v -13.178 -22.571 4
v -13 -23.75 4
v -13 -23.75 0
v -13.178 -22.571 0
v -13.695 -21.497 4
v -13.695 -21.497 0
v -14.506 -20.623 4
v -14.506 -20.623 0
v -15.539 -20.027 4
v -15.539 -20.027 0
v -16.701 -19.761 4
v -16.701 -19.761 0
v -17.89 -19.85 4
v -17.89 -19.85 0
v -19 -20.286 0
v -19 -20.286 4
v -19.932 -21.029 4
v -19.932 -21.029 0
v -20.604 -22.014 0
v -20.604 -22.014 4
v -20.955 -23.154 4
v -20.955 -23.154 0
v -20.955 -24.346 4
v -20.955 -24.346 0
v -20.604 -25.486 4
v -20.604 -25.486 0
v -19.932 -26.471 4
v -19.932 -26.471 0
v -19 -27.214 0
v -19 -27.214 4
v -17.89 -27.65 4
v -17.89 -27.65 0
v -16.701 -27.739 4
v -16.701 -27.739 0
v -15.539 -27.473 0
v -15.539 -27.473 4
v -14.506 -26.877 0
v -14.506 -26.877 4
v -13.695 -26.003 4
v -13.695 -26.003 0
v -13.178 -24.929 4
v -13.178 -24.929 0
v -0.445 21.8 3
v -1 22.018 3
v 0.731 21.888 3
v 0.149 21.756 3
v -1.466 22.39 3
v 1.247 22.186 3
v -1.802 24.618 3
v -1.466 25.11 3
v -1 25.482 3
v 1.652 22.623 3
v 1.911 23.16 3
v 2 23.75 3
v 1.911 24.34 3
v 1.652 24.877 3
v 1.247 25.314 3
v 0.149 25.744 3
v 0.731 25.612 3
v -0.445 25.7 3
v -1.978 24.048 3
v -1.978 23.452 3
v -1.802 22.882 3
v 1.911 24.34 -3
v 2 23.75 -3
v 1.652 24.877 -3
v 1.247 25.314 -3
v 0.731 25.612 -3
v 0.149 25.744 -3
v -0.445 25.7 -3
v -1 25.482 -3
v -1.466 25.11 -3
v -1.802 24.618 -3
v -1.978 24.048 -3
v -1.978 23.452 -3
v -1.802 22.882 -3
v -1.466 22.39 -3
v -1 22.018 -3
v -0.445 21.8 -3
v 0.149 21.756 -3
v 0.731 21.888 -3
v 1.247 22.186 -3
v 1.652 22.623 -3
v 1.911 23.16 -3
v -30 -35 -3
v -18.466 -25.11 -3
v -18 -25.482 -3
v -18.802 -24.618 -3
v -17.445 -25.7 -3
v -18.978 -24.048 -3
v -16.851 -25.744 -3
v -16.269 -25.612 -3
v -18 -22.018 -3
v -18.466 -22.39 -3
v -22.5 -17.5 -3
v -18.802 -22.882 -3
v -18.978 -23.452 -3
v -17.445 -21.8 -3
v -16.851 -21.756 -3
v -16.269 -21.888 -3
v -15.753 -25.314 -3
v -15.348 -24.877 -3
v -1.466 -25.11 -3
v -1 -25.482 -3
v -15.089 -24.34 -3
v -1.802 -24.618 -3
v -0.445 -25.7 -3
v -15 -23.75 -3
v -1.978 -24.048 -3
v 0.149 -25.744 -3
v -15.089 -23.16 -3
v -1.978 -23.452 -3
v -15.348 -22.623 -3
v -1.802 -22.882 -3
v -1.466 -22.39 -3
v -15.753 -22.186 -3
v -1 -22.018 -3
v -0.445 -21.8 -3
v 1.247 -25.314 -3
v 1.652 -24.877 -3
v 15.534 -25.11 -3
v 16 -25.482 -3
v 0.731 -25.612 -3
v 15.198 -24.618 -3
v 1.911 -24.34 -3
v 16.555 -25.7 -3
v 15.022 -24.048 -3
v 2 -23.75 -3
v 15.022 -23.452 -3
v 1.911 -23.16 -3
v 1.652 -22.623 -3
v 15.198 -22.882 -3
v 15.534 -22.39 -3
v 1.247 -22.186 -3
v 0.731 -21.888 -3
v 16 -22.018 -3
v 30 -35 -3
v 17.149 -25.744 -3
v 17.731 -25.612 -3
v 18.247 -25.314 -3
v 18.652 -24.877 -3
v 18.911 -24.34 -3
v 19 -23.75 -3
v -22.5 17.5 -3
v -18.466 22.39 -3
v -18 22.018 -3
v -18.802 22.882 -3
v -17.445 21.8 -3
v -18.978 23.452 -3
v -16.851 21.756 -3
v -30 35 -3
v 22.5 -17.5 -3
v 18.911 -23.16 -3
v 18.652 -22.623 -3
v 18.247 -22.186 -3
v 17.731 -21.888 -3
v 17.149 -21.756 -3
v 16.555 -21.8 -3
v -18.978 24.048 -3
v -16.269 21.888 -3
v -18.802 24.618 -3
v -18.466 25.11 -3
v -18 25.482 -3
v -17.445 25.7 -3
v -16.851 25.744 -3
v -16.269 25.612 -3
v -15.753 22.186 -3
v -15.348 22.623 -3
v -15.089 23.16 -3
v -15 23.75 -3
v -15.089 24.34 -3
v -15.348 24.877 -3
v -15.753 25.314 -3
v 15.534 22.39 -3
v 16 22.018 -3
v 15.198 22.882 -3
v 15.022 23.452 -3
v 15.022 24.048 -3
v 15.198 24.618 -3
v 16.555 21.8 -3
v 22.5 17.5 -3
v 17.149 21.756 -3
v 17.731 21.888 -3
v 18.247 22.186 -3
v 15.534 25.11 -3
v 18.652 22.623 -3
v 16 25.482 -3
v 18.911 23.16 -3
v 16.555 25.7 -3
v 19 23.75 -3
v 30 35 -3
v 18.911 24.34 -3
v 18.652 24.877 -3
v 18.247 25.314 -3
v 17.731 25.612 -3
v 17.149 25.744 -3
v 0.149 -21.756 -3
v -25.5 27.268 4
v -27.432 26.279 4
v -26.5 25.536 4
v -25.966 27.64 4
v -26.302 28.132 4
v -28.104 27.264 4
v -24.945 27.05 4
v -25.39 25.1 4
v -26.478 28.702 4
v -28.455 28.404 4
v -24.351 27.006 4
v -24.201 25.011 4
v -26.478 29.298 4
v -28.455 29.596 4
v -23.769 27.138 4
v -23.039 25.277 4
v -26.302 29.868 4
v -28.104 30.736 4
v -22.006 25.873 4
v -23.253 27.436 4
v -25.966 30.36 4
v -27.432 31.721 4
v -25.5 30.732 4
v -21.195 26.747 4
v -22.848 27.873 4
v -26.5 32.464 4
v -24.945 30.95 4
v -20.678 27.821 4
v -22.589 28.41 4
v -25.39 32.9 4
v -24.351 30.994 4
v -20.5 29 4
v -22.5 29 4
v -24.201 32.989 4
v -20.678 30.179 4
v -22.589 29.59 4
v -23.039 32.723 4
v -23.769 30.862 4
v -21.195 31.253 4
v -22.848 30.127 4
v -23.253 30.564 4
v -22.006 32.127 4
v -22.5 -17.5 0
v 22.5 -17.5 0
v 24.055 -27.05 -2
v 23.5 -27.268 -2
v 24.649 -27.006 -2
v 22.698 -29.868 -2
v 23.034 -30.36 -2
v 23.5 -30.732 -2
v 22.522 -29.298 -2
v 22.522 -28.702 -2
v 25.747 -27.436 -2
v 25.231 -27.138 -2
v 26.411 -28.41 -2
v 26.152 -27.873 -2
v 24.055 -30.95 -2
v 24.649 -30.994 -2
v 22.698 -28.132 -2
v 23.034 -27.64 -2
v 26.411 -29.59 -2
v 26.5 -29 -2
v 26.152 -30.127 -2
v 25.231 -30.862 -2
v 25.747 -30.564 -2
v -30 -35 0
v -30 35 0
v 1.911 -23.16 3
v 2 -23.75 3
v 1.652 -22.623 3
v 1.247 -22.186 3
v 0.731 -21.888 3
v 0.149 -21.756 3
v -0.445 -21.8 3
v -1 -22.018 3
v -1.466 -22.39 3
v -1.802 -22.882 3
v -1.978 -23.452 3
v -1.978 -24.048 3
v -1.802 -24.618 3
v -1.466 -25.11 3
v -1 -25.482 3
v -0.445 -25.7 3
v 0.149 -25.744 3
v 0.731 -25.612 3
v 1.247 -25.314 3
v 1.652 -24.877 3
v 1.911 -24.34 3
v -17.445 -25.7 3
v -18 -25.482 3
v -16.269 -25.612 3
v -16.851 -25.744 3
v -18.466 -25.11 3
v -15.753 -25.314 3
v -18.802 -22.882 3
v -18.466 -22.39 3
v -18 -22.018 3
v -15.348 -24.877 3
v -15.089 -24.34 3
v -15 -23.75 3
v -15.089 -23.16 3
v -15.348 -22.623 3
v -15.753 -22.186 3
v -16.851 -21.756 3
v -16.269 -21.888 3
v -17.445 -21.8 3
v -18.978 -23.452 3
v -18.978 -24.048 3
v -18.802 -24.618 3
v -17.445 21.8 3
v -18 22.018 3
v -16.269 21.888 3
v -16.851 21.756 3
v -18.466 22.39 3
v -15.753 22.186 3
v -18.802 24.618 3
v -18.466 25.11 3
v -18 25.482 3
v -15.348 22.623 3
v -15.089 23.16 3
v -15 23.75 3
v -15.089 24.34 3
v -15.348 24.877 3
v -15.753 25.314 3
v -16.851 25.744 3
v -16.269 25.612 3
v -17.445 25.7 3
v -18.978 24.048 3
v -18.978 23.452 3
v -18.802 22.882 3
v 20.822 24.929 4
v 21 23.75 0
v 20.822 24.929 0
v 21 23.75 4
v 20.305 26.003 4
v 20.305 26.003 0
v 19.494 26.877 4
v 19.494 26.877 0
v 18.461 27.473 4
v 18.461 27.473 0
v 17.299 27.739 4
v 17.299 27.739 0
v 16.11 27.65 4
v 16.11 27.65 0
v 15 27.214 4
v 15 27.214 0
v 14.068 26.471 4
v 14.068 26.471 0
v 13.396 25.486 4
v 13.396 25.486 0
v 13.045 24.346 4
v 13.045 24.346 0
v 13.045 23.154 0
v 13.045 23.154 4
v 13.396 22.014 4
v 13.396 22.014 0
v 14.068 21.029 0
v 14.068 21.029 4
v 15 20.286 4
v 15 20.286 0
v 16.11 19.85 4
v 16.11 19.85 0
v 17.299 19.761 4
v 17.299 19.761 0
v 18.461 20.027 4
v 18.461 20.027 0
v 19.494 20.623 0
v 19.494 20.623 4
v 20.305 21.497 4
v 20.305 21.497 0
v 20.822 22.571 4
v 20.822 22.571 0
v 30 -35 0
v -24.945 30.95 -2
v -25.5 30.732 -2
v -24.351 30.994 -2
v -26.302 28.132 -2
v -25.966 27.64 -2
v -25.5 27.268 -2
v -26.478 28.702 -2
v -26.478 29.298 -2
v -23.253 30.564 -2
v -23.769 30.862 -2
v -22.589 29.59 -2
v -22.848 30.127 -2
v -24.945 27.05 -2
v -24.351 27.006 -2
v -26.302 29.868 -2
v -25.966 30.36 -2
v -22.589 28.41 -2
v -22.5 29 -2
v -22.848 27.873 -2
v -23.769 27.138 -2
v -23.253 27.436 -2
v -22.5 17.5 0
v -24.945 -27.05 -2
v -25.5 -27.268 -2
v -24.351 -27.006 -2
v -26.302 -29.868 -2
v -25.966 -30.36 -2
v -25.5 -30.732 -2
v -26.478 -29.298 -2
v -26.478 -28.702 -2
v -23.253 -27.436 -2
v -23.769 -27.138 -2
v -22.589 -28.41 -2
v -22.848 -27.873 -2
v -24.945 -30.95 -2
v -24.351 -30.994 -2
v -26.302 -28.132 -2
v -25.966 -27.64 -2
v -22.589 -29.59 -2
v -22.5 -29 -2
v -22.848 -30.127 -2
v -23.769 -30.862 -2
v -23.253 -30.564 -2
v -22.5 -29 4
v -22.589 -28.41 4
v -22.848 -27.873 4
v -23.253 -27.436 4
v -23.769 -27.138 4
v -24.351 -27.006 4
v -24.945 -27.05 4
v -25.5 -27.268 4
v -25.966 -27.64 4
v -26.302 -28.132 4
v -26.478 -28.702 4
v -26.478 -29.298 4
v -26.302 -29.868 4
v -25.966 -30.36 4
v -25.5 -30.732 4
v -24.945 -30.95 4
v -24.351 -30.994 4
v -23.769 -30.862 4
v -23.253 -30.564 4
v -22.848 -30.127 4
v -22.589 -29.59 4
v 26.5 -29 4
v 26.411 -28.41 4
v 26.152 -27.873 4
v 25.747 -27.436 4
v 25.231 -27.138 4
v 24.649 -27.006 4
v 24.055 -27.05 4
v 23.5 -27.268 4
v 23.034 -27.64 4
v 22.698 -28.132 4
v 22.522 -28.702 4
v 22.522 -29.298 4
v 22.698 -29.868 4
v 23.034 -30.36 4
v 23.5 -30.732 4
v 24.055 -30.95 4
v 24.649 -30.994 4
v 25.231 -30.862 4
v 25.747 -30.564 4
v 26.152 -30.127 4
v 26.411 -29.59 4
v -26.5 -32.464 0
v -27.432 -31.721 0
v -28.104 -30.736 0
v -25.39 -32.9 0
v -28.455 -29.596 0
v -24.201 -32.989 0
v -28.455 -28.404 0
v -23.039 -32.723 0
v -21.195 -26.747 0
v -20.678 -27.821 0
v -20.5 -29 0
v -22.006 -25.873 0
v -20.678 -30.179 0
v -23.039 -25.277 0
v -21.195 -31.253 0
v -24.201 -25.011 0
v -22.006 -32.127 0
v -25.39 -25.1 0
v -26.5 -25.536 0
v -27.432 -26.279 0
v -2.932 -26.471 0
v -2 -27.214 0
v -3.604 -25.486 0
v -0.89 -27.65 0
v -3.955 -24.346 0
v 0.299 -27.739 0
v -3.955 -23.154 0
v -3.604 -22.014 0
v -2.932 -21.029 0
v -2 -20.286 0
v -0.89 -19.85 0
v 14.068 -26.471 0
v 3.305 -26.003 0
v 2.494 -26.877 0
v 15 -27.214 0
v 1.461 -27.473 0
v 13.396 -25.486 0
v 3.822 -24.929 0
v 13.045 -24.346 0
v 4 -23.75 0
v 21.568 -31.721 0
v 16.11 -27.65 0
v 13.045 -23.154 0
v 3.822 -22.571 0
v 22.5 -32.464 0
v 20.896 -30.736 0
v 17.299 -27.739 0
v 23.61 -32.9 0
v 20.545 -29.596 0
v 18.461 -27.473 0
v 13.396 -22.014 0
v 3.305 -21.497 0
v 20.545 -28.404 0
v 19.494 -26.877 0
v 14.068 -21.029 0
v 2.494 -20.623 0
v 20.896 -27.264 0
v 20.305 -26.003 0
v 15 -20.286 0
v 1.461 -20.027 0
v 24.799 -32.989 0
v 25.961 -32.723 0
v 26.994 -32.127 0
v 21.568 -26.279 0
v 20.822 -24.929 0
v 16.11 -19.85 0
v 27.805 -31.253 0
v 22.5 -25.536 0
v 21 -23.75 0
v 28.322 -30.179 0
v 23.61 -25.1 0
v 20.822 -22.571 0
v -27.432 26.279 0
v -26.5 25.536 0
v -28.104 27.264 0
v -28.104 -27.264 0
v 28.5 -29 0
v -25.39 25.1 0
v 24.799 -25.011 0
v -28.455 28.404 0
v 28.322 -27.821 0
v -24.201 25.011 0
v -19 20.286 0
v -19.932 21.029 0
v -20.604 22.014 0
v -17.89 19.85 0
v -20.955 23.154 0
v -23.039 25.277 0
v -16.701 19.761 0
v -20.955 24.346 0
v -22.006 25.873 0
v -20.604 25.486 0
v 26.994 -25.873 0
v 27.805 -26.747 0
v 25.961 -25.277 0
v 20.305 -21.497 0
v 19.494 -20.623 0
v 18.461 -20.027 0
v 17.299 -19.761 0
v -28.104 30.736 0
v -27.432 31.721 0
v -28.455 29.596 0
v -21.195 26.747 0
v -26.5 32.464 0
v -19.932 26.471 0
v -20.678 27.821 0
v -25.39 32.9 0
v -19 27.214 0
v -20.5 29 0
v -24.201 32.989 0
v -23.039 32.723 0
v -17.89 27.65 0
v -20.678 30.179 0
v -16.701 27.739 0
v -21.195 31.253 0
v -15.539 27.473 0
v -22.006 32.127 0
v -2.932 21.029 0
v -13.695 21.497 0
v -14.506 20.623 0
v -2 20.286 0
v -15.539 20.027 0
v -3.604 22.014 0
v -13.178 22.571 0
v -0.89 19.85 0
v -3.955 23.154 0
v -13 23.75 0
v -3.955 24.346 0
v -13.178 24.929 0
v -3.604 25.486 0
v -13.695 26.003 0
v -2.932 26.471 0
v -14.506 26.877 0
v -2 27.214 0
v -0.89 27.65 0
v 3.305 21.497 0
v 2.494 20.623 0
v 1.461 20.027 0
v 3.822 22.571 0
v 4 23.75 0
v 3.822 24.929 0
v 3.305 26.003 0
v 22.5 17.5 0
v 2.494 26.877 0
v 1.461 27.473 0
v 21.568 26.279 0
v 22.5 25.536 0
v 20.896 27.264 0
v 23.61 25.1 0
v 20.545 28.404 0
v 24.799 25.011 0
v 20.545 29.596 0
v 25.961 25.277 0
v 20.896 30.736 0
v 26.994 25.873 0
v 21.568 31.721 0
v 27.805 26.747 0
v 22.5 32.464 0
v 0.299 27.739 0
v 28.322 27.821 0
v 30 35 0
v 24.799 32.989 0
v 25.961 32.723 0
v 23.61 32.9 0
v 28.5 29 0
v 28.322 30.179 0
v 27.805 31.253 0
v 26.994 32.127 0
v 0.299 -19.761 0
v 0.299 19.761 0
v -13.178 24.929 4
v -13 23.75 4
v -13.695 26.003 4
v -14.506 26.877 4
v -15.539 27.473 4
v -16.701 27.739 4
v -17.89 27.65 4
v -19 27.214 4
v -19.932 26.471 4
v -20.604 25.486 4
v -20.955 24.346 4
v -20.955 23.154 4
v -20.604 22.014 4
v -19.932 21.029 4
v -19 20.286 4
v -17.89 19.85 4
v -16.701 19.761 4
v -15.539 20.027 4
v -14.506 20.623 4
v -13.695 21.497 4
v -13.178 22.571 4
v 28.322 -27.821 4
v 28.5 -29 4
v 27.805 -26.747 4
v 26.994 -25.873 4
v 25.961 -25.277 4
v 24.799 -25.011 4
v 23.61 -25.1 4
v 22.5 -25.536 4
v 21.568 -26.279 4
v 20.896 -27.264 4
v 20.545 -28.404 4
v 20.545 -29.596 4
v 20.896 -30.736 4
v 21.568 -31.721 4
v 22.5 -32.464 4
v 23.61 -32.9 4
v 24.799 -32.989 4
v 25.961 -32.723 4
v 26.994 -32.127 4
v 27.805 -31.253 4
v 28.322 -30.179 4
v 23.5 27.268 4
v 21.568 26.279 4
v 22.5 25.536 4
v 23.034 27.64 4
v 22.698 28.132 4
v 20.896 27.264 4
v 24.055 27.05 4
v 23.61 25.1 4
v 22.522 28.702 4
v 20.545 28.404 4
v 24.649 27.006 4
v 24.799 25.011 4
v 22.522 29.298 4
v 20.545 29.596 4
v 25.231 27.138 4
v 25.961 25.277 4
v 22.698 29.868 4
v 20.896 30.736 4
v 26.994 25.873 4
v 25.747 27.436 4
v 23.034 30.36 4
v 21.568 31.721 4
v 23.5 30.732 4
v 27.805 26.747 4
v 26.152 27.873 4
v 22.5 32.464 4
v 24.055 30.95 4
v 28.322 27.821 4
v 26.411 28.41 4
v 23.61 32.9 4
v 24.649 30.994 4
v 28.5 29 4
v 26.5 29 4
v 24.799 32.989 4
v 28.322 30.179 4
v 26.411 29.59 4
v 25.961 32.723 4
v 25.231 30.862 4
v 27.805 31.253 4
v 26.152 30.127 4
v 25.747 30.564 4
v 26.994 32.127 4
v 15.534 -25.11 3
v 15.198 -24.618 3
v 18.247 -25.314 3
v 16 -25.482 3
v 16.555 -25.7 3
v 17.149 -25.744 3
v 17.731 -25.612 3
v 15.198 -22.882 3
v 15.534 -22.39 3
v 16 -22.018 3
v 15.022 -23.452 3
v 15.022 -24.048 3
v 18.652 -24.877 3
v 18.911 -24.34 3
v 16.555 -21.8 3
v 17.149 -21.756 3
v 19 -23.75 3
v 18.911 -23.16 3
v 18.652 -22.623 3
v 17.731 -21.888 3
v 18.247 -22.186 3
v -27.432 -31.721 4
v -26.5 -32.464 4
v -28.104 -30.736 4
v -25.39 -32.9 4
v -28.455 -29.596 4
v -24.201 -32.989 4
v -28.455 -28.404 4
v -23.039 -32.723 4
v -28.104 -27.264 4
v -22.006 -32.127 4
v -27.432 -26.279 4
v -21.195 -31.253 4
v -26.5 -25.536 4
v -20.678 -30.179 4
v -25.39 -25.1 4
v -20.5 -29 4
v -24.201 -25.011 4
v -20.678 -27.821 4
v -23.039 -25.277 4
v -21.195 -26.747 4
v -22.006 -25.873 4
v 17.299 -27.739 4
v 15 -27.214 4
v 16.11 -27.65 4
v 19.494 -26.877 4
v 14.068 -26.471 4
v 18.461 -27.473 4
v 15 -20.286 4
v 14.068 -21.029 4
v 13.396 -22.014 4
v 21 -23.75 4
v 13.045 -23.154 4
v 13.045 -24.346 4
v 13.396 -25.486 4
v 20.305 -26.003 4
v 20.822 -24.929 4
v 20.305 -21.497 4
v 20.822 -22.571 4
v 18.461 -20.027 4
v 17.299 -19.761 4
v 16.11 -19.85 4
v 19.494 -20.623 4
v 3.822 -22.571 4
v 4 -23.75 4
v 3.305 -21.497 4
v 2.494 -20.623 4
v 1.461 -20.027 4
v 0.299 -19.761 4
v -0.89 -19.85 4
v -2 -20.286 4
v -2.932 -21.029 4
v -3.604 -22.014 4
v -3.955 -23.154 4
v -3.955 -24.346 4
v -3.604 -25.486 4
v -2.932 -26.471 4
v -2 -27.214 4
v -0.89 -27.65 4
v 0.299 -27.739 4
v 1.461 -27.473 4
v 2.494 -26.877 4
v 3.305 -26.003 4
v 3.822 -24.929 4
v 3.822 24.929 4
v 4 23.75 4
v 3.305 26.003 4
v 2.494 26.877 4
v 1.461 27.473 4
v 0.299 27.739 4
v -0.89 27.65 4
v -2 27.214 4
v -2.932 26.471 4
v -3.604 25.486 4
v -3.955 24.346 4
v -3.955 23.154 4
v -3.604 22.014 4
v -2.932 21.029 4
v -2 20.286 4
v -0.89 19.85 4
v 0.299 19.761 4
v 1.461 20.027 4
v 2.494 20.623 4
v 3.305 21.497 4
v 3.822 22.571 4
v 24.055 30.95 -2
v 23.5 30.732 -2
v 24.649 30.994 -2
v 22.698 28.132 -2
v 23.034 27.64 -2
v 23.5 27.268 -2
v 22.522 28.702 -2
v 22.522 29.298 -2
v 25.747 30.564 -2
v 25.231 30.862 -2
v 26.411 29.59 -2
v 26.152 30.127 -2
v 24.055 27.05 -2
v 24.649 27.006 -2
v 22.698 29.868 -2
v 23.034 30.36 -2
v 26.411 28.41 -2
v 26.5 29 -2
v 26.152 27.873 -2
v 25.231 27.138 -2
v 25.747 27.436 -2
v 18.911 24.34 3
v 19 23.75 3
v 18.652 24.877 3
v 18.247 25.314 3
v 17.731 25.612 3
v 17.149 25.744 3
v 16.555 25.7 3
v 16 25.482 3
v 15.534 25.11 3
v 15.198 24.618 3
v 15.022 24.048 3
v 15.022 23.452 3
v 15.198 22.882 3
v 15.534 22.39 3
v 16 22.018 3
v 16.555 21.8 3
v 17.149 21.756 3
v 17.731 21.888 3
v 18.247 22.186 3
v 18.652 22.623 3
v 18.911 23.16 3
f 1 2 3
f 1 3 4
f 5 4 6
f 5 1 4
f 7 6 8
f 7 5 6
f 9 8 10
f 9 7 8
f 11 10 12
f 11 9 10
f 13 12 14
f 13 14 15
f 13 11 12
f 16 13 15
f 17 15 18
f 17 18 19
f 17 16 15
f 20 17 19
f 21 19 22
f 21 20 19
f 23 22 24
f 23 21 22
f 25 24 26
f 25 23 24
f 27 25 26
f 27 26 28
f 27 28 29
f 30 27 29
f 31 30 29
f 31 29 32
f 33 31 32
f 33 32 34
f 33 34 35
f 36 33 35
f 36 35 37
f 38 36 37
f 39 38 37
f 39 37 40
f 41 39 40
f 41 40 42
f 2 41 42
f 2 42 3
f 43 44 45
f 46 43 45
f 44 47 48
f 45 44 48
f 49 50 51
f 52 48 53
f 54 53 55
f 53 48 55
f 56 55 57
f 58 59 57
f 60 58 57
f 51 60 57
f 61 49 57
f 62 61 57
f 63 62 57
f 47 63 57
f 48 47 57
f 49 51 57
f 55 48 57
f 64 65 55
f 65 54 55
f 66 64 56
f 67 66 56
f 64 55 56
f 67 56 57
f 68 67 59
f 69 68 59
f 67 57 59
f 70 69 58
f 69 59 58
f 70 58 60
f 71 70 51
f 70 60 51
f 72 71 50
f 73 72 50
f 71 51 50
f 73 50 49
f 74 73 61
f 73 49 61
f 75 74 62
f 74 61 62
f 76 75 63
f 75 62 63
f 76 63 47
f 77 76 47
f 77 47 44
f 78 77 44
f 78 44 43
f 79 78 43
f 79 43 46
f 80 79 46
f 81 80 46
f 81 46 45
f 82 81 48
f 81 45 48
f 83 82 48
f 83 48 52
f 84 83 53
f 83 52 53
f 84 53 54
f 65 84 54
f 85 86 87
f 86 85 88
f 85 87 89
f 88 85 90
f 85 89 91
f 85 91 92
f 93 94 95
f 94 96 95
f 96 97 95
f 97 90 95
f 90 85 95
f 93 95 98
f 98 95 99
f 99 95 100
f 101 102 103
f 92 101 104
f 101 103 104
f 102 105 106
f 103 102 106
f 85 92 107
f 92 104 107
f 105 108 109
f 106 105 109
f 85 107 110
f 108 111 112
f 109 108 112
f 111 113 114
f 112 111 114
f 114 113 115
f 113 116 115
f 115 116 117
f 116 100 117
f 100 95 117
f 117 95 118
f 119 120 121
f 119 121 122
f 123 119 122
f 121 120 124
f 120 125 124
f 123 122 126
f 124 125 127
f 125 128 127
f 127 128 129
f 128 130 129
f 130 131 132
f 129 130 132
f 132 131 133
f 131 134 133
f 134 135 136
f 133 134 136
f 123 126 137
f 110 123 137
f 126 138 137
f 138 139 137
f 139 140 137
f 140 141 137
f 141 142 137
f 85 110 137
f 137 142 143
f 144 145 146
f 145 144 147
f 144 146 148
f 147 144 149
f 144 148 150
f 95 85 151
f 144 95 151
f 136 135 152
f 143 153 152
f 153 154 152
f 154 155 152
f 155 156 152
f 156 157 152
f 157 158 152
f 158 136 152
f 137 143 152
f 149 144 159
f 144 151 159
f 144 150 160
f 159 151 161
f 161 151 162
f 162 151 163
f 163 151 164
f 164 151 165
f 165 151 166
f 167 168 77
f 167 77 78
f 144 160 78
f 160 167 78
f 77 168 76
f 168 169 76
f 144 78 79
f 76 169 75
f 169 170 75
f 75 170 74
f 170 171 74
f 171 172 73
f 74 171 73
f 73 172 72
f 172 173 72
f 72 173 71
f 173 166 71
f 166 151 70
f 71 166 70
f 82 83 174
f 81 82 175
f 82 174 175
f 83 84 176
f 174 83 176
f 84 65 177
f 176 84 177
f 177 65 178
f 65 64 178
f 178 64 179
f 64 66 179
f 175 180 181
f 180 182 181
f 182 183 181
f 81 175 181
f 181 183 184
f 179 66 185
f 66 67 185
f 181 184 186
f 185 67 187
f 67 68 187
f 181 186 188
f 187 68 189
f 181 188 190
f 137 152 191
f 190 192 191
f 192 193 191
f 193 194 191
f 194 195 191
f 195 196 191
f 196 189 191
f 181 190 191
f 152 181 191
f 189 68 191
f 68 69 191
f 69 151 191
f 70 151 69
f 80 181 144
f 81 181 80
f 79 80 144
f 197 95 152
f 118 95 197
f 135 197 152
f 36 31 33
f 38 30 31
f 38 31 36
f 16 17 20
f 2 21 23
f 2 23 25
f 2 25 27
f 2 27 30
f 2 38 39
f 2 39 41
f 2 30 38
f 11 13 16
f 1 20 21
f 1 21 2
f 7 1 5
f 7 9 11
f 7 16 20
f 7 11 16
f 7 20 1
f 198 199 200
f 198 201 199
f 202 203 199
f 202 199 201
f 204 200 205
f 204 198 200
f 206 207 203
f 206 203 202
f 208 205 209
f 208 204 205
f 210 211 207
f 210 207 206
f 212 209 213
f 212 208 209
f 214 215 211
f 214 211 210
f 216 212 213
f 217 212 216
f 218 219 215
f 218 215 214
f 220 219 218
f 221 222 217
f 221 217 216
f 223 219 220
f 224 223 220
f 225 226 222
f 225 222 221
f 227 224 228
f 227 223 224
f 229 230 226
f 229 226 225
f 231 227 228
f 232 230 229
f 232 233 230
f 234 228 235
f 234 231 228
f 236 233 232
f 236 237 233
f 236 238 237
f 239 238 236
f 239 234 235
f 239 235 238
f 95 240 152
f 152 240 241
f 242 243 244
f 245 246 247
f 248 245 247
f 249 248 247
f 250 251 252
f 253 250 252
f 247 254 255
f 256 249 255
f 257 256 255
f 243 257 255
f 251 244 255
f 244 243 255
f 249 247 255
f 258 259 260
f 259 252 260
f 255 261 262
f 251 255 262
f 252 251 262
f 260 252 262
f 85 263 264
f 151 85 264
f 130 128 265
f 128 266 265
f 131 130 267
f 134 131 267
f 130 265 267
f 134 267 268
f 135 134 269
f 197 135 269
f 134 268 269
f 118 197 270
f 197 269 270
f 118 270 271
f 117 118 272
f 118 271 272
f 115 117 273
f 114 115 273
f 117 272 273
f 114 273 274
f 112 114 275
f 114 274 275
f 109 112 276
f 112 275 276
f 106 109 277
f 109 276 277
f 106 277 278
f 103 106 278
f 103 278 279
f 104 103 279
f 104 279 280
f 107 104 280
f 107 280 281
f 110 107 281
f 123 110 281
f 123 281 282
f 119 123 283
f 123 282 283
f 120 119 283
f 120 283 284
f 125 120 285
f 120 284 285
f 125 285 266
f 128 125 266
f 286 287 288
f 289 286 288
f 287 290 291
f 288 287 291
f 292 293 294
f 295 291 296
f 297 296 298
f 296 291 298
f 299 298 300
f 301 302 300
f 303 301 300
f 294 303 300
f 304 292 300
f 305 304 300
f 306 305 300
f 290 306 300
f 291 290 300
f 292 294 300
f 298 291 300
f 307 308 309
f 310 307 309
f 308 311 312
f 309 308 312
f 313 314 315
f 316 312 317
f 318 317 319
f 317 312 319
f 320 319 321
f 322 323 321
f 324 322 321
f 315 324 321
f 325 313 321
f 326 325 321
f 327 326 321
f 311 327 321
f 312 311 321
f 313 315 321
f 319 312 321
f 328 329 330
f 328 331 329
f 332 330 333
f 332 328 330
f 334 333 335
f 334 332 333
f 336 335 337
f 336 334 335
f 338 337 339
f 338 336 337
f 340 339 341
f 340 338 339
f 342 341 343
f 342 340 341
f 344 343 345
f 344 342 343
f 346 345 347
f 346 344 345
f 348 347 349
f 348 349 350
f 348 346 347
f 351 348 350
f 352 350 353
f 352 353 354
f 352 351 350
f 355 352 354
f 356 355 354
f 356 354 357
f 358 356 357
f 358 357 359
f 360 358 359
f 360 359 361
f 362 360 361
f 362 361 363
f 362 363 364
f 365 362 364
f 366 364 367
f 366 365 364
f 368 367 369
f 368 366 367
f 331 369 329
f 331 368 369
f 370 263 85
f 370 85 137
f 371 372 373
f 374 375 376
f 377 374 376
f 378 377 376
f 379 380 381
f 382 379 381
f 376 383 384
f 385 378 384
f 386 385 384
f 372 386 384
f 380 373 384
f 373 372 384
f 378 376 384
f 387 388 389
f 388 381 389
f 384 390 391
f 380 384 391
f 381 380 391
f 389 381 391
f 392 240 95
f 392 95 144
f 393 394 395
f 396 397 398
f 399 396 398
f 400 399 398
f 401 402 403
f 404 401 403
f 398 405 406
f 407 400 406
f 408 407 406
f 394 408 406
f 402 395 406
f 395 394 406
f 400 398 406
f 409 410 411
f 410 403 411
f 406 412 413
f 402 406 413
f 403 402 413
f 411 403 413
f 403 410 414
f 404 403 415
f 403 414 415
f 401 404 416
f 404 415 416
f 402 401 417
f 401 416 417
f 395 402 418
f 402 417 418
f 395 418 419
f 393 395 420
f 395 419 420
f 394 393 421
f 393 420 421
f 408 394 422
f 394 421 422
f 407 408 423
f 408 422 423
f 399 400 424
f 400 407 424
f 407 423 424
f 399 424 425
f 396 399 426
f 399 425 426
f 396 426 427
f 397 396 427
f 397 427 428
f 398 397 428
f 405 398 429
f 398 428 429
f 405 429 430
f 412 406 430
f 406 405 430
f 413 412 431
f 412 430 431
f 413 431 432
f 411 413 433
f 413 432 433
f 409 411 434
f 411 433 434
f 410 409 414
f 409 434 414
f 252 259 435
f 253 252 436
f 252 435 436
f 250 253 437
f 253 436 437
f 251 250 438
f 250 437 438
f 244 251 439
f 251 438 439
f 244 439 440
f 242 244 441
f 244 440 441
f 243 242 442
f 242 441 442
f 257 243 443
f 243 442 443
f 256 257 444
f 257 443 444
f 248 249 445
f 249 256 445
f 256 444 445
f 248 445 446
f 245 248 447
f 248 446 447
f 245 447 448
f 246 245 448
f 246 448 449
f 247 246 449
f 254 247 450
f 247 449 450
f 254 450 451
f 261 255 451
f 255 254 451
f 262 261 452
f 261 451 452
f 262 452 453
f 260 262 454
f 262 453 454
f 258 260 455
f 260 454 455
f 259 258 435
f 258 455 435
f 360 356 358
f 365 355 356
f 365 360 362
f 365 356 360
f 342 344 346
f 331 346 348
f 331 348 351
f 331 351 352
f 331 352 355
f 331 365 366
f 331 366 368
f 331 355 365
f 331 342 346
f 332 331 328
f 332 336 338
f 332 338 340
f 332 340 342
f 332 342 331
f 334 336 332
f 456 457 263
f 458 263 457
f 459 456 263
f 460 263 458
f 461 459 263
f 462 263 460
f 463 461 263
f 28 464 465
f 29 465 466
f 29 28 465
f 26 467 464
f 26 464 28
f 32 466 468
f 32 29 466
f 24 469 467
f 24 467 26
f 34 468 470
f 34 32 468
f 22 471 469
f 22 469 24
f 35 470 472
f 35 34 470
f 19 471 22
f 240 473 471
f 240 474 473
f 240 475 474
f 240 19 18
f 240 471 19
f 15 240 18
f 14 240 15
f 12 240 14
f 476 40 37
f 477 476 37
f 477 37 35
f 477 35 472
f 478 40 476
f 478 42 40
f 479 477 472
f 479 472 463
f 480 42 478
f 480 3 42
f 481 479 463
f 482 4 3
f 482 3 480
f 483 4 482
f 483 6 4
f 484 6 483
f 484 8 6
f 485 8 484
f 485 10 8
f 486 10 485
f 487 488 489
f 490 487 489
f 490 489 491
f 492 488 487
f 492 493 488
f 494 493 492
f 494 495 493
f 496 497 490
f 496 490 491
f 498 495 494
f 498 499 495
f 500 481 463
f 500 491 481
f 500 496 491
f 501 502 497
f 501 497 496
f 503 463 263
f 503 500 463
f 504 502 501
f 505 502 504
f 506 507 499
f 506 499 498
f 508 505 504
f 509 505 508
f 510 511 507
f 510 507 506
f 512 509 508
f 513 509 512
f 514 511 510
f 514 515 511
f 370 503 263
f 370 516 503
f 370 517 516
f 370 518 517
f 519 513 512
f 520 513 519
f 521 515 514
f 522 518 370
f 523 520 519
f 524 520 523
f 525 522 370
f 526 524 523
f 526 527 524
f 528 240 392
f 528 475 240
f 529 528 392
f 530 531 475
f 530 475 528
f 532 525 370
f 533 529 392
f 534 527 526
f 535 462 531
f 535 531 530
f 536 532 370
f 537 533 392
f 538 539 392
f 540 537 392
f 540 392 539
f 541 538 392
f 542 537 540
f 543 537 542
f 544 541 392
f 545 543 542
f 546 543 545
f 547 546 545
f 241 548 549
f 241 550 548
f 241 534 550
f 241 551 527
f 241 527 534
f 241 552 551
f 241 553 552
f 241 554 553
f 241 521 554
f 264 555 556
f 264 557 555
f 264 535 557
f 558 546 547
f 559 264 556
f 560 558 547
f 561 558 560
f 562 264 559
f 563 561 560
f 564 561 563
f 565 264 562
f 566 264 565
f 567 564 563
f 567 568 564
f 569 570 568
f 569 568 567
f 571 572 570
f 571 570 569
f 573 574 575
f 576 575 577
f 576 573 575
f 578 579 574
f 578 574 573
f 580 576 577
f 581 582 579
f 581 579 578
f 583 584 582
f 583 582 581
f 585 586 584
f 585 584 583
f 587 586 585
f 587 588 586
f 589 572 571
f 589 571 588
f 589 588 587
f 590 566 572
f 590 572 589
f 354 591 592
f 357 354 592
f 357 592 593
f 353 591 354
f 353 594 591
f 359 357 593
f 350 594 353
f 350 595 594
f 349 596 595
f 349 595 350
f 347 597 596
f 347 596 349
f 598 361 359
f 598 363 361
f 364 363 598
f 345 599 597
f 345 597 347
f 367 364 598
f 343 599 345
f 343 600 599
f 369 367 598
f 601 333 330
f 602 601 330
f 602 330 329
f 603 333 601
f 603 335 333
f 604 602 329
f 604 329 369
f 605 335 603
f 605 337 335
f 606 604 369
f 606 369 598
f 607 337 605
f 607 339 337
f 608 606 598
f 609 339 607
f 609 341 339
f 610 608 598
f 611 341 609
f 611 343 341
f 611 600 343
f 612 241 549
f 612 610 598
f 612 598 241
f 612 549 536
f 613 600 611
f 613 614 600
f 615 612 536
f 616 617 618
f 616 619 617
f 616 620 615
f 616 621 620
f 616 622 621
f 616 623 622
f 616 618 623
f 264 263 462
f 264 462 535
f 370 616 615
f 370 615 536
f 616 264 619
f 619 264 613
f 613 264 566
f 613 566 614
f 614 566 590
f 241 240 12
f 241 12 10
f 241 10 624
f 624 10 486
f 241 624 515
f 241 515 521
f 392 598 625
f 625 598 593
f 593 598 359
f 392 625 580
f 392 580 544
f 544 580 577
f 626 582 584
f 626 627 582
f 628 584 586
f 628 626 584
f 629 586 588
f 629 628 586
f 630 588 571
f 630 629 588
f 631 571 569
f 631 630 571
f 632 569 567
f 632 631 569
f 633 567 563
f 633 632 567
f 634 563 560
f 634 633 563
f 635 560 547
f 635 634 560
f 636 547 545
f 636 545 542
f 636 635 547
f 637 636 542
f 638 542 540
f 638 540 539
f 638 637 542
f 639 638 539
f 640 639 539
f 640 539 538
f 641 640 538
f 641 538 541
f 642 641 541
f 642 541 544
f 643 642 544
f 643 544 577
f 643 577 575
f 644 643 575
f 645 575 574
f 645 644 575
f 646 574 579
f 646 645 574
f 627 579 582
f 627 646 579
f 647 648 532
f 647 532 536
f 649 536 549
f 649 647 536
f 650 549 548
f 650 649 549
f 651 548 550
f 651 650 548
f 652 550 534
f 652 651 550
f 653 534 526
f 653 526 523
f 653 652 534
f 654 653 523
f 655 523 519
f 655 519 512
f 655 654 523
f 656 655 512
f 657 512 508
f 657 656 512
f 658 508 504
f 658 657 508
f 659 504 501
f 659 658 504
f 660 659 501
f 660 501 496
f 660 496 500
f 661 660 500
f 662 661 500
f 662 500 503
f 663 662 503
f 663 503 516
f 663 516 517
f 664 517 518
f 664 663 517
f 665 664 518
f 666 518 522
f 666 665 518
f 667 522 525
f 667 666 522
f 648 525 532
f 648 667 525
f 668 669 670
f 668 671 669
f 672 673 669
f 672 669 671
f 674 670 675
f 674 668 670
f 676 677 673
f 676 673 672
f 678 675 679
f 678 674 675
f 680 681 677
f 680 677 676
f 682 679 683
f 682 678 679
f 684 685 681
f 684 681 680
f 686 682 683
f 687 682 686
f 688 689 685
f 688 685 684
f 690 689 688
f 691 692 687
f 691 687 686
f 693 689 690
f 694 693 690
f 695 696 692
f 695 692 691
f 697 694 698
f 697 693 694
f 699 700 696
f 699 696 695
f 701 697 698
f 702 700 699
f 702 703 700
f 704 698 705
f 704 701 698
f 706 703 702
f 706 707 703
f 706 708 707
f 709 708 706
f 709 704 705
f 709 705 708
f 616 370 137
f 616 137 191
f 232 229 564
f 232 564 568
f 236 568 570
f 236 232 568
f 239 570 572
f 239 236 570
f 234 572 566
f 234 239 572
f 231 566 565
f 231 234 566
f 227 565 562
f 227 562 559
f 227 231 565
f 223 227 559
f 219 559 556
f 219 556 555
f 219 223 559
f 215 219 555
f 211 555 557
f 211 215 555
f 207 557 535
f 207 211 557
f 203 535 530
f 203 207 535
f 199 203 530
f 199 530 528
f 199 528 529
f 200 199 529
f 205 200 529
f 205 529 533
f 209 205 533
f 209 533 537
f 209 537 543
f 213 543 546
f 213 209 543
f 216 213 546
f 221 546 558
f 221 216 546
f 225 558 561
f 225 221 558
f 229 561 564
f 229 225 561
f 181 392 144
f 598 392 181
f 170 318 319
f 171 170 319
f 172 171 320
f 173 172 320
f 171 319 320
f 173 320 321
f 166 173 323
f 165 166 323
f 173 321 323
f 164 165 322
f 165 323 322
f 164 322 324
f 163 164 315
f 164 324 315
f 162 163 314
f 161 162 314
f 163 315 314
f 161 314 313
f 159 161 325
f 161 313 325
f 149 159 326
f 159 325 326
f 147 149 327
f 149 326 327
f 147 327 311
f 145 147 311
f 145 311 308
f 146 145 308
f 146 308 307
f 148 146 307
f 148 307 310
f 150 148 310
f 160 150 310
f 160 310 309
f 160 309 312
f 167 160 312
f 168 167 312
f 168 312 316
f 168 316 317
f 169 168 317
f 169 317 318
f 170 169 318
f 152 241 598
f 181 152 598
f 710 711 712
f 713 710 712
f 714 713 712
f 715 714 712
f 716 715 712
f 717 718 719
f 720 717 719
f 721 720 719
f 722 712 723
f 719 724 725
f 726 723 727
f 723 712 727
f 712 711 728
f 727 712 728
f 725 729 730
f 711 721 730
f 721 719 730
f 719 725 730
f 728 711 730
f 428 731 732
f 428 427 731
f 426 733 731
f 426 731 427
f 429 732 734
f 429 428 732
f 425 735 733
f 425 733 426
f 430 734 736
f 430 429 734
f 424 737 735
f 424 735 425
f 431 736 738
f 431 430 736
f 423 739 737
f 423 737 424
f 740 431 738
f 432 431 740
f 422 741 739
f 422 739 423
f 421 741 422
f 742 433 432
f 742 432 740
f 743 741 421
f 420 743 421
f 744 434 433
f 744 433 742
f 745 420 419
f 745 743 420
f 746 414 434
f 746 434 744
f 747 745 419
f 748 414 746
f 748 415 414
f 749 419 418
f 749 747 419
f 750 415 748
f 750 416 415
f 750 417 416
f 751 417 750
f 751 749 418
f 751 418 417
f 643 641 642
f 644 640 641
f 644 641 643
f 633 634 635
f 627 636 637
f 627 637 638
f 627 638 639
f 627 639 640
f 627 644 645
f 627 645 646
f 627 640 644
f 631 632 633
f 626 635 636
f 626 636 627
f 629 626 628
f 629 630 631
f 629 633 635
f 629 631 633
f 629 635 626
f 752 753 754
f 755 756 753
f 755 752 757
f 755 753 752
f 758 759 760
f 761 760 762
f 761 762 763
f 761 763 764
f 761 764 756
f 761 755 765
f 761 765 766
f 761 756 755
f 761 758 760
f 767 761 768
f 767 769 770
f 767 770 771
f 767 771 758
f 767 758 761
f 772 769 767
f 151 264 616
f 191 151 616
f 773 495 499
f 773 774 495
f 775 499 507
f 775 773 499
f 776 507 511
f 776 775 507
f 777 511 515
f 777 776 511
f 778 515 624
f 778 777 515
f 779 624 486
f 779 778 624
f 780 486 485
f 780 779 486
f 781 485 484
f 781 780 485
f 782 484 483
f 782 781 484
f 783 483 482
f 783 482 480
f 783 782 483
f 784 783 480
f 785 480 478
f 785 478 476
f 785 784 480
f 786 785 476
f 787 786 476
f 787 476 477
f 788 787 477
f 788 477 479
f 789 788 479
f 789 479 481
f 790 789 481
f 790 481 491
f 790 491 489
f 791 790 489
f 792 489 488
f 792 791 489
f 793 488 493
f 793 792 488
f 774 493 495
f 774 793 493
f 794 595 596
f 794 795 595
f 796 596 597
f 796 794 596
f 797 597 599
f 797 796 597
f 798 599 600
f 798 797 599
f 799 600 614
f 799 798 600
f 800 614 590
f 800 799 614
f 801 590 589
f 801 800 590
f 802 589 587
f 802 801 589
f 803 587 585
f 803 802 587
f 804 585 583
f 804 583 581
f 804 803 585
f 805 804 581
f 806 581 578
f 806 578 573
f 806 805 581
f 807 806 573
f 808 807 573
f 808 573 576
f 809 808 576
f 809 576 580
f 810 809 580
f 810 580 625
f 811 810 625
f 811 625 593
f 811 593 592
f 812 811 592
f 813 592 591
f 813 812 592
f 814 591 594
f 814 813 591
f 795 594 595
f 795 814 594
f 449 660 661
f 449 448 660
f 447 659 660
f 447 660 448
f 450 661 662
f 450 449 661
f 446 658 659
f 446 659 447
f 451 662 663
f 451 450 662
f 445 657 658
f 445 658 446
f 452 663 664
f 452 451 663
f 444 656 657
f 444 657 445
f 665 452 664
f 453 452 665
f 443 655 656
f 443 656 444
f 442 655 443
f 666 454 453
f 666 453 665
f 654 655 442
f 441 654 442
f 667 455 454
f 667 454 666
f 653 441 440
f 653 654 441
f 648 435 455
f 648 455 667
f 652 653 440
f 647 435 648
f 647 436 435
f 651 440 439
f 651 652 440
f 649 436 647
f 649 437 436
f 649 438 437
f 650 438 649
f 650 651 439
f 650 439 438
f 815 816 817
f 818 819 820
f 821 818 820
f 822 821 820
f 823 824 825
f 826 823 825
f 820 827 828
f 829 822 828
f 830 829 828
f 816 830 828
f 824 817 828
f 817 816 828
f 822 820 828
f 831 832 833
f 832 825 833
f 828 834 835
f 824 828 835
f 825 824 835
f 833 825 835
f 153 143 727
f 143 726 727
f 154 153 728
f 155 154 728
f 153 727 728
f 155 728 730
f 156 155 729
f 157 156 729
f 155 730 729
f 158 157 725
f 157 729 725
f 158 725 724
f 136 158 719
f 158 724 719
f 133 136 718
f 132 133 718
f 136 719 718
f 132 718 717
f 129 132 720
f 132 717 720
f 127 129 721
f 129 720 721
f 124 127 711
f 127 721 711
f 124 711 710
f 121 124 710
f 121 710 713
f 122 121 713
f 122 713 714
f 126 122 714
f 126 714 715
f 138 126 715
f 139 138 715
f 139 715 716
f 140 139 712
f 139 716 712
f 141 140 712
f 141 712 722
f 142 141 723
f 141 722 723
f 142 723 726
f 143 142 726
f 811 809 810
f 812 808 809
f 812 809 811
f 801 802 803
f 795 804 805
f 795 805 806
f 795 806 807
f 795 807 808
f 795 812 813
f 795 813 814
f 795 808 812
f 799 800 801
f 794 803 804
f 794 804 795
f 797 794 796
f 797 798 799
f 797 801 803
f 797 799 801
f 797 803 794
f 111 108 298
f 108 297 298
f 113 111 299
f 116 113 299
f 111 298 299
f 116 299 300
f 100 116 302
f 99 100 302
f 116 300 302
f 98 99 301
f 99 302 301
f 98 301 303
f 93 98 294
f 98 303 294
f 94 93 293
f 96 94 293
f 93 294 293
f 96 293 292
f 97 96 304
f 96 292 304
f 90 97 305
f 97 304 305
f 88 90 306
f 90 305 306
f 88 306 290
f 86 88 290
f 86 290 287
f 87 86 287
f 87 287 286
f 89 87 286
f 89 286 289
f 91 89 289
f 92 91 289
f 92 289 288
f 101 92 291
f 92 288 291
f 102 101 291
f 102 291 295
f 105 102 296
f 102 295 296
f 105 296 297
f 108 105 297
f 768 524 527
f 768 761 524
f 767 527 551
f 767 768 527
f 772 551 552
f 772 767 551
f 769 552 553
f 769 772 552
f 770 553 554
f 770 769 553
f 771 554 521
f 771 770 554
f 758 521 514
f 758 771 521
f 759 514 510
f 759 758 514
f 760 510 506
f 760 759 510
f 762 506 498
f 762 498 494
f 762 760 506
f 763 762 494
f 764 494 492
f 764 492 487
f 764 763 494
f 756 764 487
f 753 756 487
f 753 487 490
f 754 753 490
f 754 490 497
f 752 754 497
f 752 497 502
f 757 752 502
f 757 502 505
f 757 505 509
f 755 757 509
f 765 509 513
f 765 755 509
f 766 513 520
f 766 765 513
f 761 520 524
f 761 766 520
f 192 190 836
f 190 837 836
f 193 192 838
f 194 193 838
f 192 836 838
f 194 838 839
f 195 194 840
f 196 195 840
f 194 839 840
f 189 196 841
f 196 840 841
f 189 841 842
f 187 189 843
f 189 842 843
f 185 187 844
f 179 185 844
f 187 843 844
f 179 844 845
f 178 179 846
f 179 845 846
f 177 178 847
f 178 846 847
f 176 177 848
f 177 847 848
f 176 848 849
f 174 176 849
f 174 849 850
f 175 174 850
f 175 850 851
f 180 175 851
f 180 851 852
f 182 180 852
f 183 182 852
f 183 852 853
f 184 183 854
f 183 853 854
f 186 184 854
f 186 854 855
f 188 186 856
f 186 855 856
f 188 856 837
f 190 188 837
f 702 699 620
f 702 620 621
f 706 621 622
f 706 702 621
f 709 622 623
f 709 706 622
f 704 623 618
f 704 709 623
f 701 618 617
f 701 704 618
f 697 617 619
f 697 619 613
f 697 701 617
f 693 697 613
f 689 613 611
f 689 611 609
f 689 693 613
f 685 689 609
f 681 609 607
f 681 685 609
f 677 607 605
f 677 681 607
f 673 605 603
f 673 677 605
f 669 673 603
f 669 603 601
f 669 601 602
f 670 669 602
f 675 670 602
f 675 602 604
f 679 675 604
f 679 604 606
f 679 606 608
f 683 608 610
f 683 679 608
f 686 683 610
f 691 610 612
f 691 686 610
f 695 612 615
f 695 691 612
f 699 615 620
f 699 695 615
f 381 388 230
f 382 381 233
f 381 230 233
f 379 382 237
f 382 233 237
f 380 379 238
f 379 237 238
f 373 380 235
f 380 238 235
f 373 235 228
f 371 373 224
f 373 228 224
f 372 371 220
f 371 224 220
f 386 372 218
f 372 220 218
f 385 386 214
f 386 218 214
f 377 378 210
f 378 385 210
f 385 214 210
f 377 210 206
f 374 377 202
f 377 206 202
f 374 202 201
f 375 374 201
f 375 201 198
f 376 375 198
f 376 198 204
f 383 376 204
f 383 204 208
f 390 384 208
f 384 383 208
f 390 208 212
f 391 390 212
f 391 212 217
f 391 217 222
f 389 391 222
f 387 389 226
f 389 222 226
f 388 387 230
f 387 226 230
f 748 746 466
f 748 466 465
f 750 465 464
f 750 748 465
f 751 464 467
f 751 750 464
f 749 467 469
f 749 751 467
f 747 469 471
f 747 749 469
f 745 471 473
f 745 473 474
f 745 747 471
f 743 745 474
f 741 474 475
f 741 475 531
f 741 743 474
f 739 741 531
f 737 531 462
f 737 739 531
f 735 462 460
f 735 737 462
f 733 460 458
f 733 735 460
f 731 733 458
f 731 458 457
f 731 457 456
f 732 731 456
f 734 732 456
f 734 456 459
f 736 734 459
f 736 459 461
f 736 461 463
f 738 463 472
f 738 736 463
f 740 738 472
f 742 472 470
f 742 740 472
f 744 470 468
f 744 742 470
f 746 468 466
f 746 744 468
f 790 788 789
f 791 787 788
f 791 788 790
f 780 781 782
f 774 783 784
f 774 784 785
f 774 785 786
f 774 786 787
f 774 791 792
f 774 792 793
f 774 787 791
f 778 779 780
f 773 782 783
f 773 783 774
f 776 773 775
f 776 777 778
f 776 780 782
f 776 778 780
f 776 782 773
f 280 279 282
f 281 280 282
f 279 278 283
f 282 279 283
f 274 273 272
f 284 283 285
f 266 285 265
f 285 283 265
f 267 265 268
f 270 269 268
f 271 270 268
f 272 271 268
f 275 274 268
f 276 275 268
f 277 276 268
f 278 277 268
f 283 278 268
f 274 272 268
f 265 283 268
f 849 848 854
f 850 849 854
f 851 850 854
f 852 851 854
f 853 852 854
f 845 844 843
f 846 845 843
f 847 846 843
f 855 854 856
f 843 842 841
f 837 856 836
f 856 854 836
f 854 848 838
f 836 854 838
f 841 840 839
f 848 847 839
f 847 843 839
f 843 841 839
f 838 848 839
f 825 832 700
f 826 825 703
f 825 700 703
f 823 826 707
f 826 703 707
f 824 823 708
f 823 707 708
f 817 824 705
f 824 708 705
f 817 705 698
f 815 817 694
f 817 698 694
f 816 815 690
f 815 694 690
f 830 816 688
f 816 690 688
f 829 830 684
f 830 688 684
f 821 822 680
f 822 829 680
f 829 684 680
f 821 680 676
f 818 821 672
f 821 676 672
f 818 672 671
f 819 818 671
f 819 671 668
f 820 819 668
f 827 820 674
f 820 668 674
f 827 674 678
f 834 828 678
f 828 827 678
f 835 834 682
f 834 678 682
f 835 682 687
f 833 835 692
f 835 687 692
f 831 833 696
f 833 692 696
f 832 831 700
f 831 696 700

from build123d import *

# Parameters (mm, degrees)
ESQUISSE1_W               = 60
ESQUISSE1_H               = 70
T_LE_DE_BASE_PLI_E1_DEPTH = 3
ENL_V_MAT_EXTRU_1_REACH   = 48.195
ESQUISSE6_R               = 2
ENL_V_MAT_EXTRU_2_REACH   = 48.195
ESQUISSE7_R               = 2
BOSS_EXTRU_1_START        = 4
ESQUISSE9_R               = 4
ESQUISSE9_R_2             = 2
BOSS_EXTRU_1_DEPTH        = 4
ENL_V_MAT_EXTRU_3_REACH   = 48.271
ESQUISSE10_W              = 45
ESQUISSE10_H              = 35
BOSS_EXTRU_2_START        = -1
ESQUISSE11_R              = 2
BOSS_EXTRU_2_DEPTH        = 1
BOSS_EXTRU_3_START        = 3
ESQUISSE12_R              = 4
ESQUISSE12_R_2            = 2
BOSS_EXTRU_3_DEPTH        = 3
BOSS_EXTRU_4_START        = 1
ESQUISSE13_R              = 4
BOSS_EXTRU_4_DEPTH        = 1


# Sheet-metal steps are written as plain solids
with BuildPart() as part:
    # Esquisse1 → Tôle de base pliée1 (new body)
    with BuildSketch(Plane.XY):
        Rectangle(ESQUISSE1_W, ESQUISSE1_H)
    extrude(amount=-T_LE_DE_BASE_PLI_E1_DEPTH)

    # Esquisse6 → Enlèv. mat.-Extru.1 (cut, up to next)
    with BuildSketch(Plane.XY, mode=Mode.PRIVATE) as enl_v_mat_extru_1_sk1:
        with Locations((-24.5, 29)):
            Circle(ESQUISSE6_R)
    enl_v_mat_extru_1_tool1 = extrude(enl_v_mat_extru_1_sk1.sketch, amount=-ENL_V_MAT_EXTRU_1_REACH, mode=Mode.PRIVATE) & part.part
    # Esquisse6 → Enlèv. mat.-Extru.1 (cut, up to next)
    with BuildSketch(Plane.XY, mode=Mode.PRIVATE) as enl_v_mat_extru_1_sk2:
        with Locations((24.5, 29)):
            Circle(ESQUISSE6_R)
    enl_v_mat_extru_1_tool2 = extrude(enl_v_mat_extru_1_sk2.sketch, amount=-ENL_V_MAT_EXTRU_1_REACH, mode=Mode.PRIVATE) & part.part
    # Esquisse6 → Enlèv. mat.-Extru.1 (cut, up to next)
    with BuildSketch(Plane.XY, mode=Mode.PRIVATE) as enl_v_mat_extru_1_sk3:
        with Locations((24.5, -29)):
            Circle(ESQUISSE6_R)
    enl_v_mat_extru_1_tool3 = extrude(enl_v_mat_extru_1_sk3.sketch, amount=-ENL_V_MAT_EXTRU_1_REACH, mode=Mode.PRIVATE) & part.part
    # Esquisse6 → Enlèv. mat.-Extru.1 (cut, up to next)
    with BuildSketch(Plane.XY, mode=Mode.PRIVATE) as enl_v_mat_extru_1_sk4:
        with Locations((-24.5, -29)):
            Circle(ESQUISSE6_R)
    enl_v_mat_extru_1_tool4 = extrude(enl_v_mat_extru_1_sk4.sketch, amount=-ENL_V_MAT_EXTRU_1_REACH, mode=Mode.PRIVATE) & part.part
    add(enl_v_mat_extru_1_tool1.solids().sort_by_distance((-24.5, 29, 0))[0], mode=Mode.SUBTRACT)
    add(enl_v_mat_extru_1_tool2.solids().sort_by_distance((24.5, 29, 0))[0], mode=Mode.SUBTRACT)
    add(enl_v_mat_extru_1_tool3.solids().sort_by_distance((24.5, -29, 0))[0], mode=Mode.SUBTRACT)
    add(enl_v_mat_extru_1_tool4.solids().sort_by_distance((-24.5, -29, 0))[0], mode=Mode.SUBTRACT)

    # Esquisse7 → Enlèv. mat.-Extru.2 (cut, up to next)
    with BuildSketch(Plane.XY, mode=Mode.PRIVATE) as enl_v_mat_extru_2_sk1:
        with Locations((-17, -23.75)):
            Circle(ESQUISSE7_R)
    enl_v_mat_extru_2_tool1 = extrude(enl_v_mat_extru_2_sk1.sketch, amount=-ENL_V_MAT_EXTRU_2_REACH, mode=Mode.PRIVATE) & part.part
    # Esquisse7 → Enlèv. mat.-Extru.2 (cut, up to next)
    with BuildSketch(Plane.XY, mode=Mode.PRIVATE) as enl_v_mat_extru_2_sk2:
        with Locations((0, -23.75)):
            Circle(ESQUISSE7_R)
    enl_v_mat_extru_2_tool2 = extrude(enl_v_mat_extru_2_sk2.sketch, amount=-ENL_V_MAT_EXTRU_2_REACH, mode=Mode.PRIVATE) & part.part
    # Esquisse7 → Enlèv. mat.-Extru.2 (cut, up to next)
    with BuildSketch(Plane.XY, mode=Mode.PRIVATE) as enl_v_mat_extru_2_sk3:
        with Locations((17, -23.75)):
            Circle(ESQUISSE7_R)
    enl_v_mat_extru_2_tool3 = extrude(enl_v_mat_extru_2_sk3.sketch, amount=-ENL_V_MAT_EXTRU_2_REACH, mode=Mode.PRIVATE) & part.part
    # Esquisse7 → Enlèv. mat.-Extru.2 (cut, up to next)
    with BuildSketch(Plane.XY, mode=Mode.PRIVATE) as enl_v_mat_extru_2_sk4:
        with Locations((0, 23.75)):
            Circle(ESQUISSE7_R)
    enl_v_mat_extru_2_tool4 = extrude(enl_v_mat_extru_2_sk4.sketch, amount=-ENL_V_MAT_EXTRU_2_REACH, mode=Mode.PRIVATE) & part.part
    # Esquisse7 → Enlèv. mat.-Extru.2 (cut, up to next)
    with BuildSketch(Plane.XY, mode=Mode.PRIVATE) as enl_v_mat_extru_2_sk5:
        with Locations((17, 23.75)):
            Circle(ESQUISSE7_R)
    enl_v_mat_extru_2_tool5 = extrude(enl_v_mat_extru_2_sk5.sketch, amount=-ENL_V_MAT_EXTRU_2_REACH, mode=Mode.PRIVATE) & part.part
    # Esquisse7 → Enlèv. mat.-Extru.2 (cut, up to next)
    with BuildSketch(Plane.XY, mode=Mode.PRIVATE) as enl_v_mat_extru_2_sk6:
        with Locations((-17, 23.75)):
            Circle(ESQUISSE7_R)
    enl_v_mat_extru_2_tool6 = extrude(enl_v_mat_extru_2_sk6.sketch, amount=-ENL_V_MAT_EXTRU_2_REACH, mode=Mode.PRIVATE) & part.part
    add(enl_v_mat_extru_2_tool1.solids().sort_by_distance((-17, -23.75, 0))[0], mode=Mode.SUBTRACT)
    add(enl_v_mat_extru_2_tool2.solids().sort_by_distance((0, -23.75, 0))[0], mode=Mode.SUBTRACT)
    add(enl_v_mat_extru_2_tool3.solids().sort_by_distance((17, -23.75, 0))[0], mode=Mode.SUBTRACT)
    add(enl_v_mat_extru_2_tool4.solids().sort_by_distance((0, 23.75, 0))[0], mode=Mode.SUBTRACT)
    add(enl_v_mat_extru_2_tool5.solids().sort_by_distance((17, 23.75, 0))[0], mode=Mode.SUBTRACT)
    add(enl_v_mat_extru_2_tool6.solids().sort_by_distance((-17, 23.75, 0))[0], mode=Mode.SUBTRACT)

    # Esquisse9 → Boss.-Extru.1 (add)
    # profile 1 of 4: a face of its own
    with BuildSketch(Plane.XY.offset(BOSS_EXTRU_1_START)):
        with Locations((-24.5, 29)):
            Circle(ESQUISSE9_R)
        with Locations((-24.5, 29)):
            Circle(ESQUISSE9_R_2, mode=Mode.SUBTRACT)
    # profile 2 of 4: a face of its own
    with BuildSketch(Plane.XY.offset(BOSS_EXTRU_1_START)):
        with Locations((24.5, 29)):
            Circle(ESQUISSE9_R)
        with Locations((24.5, 29)):
            Circle(ESQUISSE9_R_2, mode=Mode.SUBTRACT)
    # profile 3 of 4: a face of its own
    with BuildSketch(Plane.XY.offset(BOSS_EXTRU_1_START)):
        with Locations((24.5, -29)):
            Circle(ESQUISSE9_R)
        with Locations((24.5, -29)):
            Circle(ESQUISSE9_R_2, mode=Mode.SUBTRACT)
    # profile 4 of 4: a face of its own
    with BuildSketch(Plane.XY.offset(BOSS_EXTRU_1_START)):
        with Locations((-24.5, -29)):
            Circle(ESQUISSE9_R)
        with Locations((-24.5, -29)):
            Circle(ESQUISSE9_R_2, mode=Mode.SUBTRACT)
    extrude(amount=-BOSS_EXTRU_1_DEPTH)

    # Esquisse10 → Enlèv. mat.-Extru.3 (cut, up to next)
    with BuildSketch(Plane.XY, mode=Mode.PRIVATE) as enl_v_mat_extru_3_sk1:
        Rectangle(ESQUISSE10_W, ESQUISSE10_H)
    enl_v_mat_extru_3_tool1 = extrude(enl_v_mat_extru_3_sk1.sketch, amount=-ENL_V_MAT_EXTRU_3_REACH, mode=Mode.PRIVATE) & part.part
    add(enl_v_mat_extru_3_tool1.solids().sort_by_distance((0, 0, 0))[0], mode=Mode.SUBTRACT)

    # Esquisse11 → Boss.-Extru.2 (add)
    with BuildSketch(Plane(origin=(0, 0, -3), x_dir=(-1, 0, 0), z_dir=(0, 0, -1)).offset(BOSS_EXTRU_2_START)):
        with Locations(Location((-24.5, -29, 0), (0, 0, 180))):
            Circle(ESQUISSE11_R)
        with Locations(Location((24.5, -29, 0), (0, 0, 180))):
            Circle(ESQUISSE11_R)
        with Locations(Location((24.5, 29, 0), (0, 0, 180))):
            Circle(ESQUISSE11_R)
        with Locations(Location((-24.5, 29, 0), (0, 0, 180))):
            Circle(ESQUISSE11_R)
    extrude(amount=BOSS_EXTRU_2_DEPTH)

    # Esquisse12 → Boss.-Extru.3 (add)
    # profile 1 of 6: a face of its own
    with BuildSketch(Plane.XY.offset(BOSS_EXTRU_3_START)):
        with Locations((-17, 23.75)):
            Circle(ESQUISSE12_R)
        with Locations((-17, 23.75)):
            Circle(ESQUISSE12_R_2, mode=Mode.SUBTRACT)
    # profile 2 of 6: a face of its own
    with BuildSketch(Plane.XY.offset(BOSS_EXTRU_3_START)):
        with Locations((0, 23.75)):
            Circle(ESQUISSE12_R)
        with Locations((0, 23.75)):
            Circle(ESQUISSE12_R_2, mode=Mode.SUBTRACT)
    # profile 3 of 6: a face of its own
    with BuildSketch(Plane.XY.offset(BOSS_EXTRU_3_START)):
        with Locations((17, 23.75)):
            Circle(ESQUISSE12_R)
        with Locations((17, 23.75)):
            Circle(ESQUISSE12_R_2, mode=Mode.SUBTRACT)
    # profile 4 of 6: a face of its own
    with BuildSketch(Plane.XY.offset(BOSS_EXTRU_3_START)):
        with Locations((17, -23.75)):
            Circle(ESQUISSE12_R)
        with Locations((17, -23.75)):
            Circle(ESQUISSE12_R_2, mode=Mode.SUBTRACT)
    # profile 5 of 6: a face of its own
    with BuildSketch(Plane.XY.offset(BOSS_EXTRU_3_START)):
        with Locations((0, -23.75)):
            Circle(ESQUISSE12_R)
        with Locations((0, -23.75)):
            Circle(ESQUISSE12_R_2, mode=Mode.SUBTRACT)
    # profile 6 of 6: a face of its own
    with BuildSketch(Plane.XY.offset(BOSS_EXTRU_3_START)):
        with Locations((-17, -23.75)):
            Circle(ESQUISSE12_R)
        with Locations((-17, -23.75)):
            Circle(ESQUISSE12_R_2, mode=Mode.SUBTRACT)
    extrude(amount=-BOSS_EXTRU_3_DEPTH)

    # Esquisse13 → Boss.-Extru.4 (add)
    with BuildSketch(Plane.XY.offset(3).offset(BOSS_EXTRU_4_START)):
        with Locations((-17, -23.75)):
            Circle(ESQUISSE13_R)
        with Locations((0, -23.75)):
            Circle(ESQUISSE13_R)
        with Locations((17, -23.75)):
            Circle(ESQUISSE13_R)
        with Locations((17, 23.75)):
            Circle(ESQUISSE13_R)
        with Locations((0, 23.75)):
            Circle(ESQUISSE13_R)
        with Locations((-17, 23.75)):
            Circle(ESQUISSE13_R)
    extrude(amount=-BOSS_EXTRU_4_DEPTH)


solid = part.part
